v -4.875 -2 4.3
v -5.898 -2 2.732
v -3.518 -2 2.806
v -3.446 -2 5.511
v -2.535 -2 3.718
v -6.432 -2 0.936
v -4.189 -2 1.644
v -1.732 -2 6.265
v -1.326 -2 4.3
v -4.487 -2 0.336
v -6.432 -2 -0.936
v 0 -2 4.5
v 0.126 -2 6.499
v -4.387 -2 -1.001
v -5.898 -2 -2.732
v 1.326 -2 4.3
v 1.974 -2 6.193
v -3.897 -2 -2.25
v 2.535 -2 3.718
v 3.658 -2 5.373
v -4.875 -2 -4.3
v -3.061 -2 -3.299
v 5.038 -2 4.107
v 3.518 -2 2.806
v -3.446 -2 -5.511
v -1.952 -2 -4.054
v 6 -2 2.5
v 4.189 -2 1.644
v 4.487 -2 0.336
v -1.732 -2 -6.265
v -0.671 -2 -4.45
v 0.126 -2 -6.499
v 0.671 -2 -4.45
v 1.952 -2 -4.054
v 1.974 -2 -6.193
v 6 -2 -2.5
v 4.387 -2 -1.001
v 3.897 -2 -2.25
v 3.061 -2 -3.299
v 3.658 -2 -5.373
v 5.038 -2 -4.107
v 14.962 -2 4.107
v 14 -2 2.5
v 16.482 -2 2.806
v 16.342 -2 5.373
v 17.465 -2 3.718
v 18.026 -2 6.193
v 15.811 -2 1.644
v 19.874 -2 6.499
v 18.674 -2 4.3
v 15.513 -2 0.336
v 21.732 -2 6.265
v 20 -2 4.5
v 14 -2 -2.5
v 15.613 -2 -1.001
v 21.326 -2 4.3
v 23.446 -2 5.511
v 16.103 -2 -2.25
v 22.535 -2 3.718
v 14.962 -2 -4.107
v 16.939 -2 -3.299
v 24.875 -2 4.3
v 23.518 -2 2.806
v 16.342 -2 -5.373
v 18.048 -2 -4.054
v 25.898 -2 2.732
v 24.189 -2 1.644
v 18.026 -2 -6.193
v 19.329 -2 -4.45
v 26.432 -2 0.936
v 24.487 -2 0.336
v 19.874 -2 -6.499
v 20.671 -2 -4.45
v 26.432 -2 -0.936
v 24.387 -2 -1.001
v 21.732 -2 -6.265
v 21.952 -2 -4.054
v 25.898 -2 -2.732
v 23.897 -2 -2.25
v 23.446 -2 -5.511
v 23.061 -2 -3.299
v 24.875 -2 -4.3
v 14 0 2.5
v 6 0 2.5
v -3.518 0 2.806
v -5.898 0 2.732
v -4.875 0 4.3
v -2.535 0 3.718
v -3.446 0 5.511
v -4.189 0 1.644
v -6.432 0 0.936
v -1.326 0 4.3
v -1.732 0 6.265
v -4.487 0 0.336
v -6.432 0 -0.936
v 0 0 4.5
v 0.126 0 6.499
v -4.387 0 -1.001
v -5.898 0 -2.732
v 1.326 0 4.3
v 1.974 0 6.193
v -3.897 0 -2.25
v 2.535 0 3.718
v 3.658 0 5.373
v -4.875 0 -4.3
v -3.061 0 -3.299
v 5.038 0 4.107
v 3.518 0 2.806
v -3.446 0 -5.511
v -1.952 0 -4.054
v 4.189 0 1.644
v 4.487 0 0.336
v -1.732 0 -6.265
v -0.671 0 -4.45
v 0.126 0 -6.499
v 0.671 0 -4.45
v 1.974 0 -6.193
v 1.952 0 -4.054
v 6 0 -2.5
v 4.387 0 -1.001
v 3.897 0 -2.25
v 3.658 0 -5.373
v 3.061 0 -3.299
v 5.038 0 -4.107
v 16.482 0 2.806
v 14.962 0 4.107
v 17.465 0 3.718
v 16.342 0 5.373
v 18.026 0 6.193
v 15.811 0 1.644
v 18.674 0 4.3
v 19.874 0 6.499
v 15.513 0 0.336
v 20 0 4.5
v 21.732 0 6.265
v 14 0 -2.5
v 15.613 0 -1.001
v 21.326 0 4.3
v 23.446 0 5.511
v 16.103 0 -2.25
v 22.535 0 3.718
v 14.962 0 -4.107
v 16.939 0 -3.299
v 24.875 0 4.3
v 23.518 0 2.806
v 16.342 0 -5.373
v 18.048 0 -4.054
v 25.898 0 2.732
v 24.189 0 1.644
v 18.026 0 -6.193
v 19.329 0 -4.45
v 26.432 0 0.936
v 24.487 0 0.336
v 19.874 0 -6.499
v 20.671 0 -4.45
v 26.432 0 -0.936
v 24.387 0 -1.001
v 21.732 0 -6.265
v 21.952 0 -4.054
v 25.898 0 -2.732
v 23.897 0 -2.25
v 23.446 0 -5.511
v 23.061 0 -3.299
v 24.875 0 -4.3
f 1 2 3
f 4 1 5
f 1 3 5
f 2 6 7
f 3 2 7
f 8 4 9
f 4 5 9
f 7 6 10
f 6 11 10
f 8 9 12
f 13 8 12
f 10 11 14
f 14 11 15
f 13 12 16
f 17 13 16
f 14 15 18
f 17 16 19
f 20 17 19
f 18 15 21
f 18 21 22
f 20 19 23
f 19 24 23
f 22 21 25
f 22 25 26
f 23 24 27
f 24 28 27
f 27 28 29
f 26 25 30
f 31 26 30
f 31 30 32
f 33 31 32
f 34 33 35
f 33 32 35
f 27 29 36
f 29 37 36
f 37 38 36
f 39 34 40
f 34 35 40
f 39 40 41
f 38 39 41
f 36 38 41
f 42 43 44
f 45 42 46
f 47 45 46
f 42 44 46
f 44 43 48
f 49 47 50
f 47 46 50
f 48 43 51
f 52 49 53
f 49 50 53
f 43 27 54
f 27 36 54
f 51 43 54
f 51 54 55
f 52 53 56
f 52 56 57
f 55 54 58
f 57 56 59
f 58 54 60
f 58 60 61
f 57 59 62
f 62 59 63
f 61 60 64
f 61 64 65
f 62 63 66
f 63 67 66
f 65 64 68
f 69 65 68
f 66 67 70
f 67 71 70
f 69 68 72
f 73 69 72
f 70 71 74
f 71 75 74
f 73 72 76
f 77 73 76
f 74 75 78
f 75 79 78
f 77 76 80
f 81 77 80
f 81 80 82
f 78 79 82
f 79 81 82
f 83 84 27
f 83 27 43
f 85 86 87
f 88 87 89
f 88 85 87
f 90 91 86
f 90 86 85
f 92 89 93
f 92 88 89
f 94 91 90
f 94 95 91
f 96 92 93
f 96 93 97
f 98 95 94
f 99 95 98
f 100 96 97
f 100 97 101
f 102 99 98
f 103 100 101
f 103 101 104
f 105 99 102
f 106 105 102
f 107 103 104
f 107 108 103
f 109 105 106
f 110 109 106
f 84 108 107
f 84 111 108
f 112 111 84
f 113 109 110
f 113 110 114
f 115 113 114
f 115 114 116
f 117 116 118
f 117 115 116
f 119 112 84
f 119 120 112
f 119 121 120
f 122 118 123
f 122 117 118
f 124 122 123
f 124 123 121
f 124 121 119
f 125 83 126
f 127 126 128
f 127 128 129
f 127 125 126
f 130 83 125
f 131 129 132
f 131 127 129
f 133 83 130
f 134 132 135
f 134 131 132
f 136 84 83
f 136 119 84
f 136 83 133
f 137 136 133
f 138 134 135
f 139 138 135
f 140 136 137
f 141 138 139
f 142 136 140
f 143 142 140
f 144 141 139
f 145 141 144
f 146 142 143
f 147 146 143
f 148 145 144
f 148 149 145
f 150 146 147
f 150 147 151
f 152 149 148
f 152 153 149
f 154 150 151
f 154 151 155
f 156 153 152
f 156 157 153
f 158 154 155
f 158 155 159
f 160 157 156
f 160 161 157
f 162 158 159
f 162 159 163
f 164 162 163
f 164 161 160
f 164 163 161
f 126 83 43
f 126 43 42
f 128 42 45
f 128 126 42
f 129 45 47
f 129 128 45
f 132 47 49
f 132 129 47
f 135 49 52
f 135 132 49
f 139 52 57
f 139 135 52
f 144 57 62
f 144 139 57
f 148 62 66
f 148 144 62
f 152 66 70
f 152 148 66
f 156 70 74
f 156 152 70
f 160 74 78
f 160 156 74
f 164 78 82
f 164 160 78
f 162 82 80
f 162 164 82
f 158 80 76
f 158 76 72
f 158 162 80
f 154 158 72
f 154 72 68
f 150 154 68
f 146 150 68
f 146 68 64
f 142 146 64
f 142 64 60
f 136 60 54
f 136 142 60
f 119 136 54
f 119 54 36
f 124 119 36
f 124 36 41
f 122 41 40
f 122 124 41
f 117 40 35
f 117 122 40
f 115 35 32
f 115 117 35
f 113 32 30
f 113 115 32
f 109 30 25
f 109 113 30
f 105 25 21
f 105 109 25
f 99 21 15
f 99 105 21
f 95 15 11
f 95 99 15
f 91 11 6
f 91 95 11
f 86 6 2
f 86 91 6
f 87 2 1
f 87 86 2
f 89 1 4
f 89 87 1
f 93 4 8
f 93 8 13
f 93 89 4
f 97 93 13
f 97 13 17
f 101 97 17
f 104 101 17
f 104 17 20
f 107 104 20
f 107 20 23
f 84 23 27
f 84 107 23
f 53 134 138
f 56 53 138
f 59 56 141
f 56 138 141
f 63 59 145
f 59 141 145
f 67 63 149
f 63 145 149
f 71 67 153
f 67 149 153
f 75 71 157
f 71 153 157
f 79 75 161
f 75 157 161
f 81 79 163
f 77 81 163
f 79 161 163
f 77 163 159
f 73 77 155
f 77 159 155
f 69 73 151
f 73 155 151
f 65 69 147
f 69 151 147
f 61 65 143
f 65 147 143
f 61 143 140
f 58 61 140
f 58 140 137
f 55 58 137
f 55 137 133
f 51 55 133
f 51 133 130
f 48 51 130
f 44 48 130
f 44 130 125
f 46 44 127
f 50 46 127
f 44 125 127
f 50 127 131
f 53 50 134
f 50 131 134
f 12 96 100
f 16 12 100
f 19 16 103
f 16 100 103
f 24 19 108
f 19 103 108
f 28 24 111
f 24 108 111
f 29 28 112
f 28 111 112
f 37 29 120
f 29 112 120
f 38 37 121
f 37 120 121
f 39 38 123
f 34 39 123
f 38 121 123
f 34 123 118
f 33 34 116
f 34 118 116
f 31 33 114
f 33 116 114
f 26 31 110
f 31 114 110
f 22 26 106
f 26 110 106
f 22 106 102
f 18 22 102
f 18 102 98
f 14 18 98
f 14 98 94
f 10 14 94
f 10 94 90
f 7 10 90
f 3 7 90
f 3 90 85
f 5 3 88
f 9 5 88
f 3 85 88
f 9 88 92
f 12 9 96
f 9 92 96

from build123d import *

# Parameters (mm, degrees)
RESSALTO_EXTRUS_O1_DEPTH = 2
ESBO_O2_R                = 4.5
CORTE_EXTRUS_O1_DEPTH    = 2


with BuildPart() as part:
    # Esboço1 → Ressalto-extrusão1 (new body)
    with BuildSketch(Plane(origin=(0, 0, 0), x_dir=(1, 0, 0), z_dir=(0, 1, 0))):
        with BuildLine():
            Line((6, -2.5), (14, -2.5))
            ThreePointArc((14, -2.5), (26.5, 0), (14, 2.5))
            Line((14, 2.5), (6, 2.5))
            ThreePointArc((6, 2.5), (-6.5, 0), (6, -2.5))
        make_face()
    extrude(amount=-RESSALTO_EXTRUS_O1_DEPTH)

    # Esboço2 → Corte-extrusão1 (cut)
    with BuildSketch(Plane(origin=(0, 0, 0), x_dir=(1, 0, 0), z_dir=(0, 1, 0))):
        with Locations(Location((0, 0, 0), (0, 0, 270))):
            Circle(ESBO_O2_R)
        with Locations(Location((20, 0, 0), (0, 0, 270))):
            Circle(ESBO_O2_R)
    extrude(amount=-CORTE_EXTRUS_O1_DEPTH, mode=Mode.SUBTRACT)


solid = part.part
